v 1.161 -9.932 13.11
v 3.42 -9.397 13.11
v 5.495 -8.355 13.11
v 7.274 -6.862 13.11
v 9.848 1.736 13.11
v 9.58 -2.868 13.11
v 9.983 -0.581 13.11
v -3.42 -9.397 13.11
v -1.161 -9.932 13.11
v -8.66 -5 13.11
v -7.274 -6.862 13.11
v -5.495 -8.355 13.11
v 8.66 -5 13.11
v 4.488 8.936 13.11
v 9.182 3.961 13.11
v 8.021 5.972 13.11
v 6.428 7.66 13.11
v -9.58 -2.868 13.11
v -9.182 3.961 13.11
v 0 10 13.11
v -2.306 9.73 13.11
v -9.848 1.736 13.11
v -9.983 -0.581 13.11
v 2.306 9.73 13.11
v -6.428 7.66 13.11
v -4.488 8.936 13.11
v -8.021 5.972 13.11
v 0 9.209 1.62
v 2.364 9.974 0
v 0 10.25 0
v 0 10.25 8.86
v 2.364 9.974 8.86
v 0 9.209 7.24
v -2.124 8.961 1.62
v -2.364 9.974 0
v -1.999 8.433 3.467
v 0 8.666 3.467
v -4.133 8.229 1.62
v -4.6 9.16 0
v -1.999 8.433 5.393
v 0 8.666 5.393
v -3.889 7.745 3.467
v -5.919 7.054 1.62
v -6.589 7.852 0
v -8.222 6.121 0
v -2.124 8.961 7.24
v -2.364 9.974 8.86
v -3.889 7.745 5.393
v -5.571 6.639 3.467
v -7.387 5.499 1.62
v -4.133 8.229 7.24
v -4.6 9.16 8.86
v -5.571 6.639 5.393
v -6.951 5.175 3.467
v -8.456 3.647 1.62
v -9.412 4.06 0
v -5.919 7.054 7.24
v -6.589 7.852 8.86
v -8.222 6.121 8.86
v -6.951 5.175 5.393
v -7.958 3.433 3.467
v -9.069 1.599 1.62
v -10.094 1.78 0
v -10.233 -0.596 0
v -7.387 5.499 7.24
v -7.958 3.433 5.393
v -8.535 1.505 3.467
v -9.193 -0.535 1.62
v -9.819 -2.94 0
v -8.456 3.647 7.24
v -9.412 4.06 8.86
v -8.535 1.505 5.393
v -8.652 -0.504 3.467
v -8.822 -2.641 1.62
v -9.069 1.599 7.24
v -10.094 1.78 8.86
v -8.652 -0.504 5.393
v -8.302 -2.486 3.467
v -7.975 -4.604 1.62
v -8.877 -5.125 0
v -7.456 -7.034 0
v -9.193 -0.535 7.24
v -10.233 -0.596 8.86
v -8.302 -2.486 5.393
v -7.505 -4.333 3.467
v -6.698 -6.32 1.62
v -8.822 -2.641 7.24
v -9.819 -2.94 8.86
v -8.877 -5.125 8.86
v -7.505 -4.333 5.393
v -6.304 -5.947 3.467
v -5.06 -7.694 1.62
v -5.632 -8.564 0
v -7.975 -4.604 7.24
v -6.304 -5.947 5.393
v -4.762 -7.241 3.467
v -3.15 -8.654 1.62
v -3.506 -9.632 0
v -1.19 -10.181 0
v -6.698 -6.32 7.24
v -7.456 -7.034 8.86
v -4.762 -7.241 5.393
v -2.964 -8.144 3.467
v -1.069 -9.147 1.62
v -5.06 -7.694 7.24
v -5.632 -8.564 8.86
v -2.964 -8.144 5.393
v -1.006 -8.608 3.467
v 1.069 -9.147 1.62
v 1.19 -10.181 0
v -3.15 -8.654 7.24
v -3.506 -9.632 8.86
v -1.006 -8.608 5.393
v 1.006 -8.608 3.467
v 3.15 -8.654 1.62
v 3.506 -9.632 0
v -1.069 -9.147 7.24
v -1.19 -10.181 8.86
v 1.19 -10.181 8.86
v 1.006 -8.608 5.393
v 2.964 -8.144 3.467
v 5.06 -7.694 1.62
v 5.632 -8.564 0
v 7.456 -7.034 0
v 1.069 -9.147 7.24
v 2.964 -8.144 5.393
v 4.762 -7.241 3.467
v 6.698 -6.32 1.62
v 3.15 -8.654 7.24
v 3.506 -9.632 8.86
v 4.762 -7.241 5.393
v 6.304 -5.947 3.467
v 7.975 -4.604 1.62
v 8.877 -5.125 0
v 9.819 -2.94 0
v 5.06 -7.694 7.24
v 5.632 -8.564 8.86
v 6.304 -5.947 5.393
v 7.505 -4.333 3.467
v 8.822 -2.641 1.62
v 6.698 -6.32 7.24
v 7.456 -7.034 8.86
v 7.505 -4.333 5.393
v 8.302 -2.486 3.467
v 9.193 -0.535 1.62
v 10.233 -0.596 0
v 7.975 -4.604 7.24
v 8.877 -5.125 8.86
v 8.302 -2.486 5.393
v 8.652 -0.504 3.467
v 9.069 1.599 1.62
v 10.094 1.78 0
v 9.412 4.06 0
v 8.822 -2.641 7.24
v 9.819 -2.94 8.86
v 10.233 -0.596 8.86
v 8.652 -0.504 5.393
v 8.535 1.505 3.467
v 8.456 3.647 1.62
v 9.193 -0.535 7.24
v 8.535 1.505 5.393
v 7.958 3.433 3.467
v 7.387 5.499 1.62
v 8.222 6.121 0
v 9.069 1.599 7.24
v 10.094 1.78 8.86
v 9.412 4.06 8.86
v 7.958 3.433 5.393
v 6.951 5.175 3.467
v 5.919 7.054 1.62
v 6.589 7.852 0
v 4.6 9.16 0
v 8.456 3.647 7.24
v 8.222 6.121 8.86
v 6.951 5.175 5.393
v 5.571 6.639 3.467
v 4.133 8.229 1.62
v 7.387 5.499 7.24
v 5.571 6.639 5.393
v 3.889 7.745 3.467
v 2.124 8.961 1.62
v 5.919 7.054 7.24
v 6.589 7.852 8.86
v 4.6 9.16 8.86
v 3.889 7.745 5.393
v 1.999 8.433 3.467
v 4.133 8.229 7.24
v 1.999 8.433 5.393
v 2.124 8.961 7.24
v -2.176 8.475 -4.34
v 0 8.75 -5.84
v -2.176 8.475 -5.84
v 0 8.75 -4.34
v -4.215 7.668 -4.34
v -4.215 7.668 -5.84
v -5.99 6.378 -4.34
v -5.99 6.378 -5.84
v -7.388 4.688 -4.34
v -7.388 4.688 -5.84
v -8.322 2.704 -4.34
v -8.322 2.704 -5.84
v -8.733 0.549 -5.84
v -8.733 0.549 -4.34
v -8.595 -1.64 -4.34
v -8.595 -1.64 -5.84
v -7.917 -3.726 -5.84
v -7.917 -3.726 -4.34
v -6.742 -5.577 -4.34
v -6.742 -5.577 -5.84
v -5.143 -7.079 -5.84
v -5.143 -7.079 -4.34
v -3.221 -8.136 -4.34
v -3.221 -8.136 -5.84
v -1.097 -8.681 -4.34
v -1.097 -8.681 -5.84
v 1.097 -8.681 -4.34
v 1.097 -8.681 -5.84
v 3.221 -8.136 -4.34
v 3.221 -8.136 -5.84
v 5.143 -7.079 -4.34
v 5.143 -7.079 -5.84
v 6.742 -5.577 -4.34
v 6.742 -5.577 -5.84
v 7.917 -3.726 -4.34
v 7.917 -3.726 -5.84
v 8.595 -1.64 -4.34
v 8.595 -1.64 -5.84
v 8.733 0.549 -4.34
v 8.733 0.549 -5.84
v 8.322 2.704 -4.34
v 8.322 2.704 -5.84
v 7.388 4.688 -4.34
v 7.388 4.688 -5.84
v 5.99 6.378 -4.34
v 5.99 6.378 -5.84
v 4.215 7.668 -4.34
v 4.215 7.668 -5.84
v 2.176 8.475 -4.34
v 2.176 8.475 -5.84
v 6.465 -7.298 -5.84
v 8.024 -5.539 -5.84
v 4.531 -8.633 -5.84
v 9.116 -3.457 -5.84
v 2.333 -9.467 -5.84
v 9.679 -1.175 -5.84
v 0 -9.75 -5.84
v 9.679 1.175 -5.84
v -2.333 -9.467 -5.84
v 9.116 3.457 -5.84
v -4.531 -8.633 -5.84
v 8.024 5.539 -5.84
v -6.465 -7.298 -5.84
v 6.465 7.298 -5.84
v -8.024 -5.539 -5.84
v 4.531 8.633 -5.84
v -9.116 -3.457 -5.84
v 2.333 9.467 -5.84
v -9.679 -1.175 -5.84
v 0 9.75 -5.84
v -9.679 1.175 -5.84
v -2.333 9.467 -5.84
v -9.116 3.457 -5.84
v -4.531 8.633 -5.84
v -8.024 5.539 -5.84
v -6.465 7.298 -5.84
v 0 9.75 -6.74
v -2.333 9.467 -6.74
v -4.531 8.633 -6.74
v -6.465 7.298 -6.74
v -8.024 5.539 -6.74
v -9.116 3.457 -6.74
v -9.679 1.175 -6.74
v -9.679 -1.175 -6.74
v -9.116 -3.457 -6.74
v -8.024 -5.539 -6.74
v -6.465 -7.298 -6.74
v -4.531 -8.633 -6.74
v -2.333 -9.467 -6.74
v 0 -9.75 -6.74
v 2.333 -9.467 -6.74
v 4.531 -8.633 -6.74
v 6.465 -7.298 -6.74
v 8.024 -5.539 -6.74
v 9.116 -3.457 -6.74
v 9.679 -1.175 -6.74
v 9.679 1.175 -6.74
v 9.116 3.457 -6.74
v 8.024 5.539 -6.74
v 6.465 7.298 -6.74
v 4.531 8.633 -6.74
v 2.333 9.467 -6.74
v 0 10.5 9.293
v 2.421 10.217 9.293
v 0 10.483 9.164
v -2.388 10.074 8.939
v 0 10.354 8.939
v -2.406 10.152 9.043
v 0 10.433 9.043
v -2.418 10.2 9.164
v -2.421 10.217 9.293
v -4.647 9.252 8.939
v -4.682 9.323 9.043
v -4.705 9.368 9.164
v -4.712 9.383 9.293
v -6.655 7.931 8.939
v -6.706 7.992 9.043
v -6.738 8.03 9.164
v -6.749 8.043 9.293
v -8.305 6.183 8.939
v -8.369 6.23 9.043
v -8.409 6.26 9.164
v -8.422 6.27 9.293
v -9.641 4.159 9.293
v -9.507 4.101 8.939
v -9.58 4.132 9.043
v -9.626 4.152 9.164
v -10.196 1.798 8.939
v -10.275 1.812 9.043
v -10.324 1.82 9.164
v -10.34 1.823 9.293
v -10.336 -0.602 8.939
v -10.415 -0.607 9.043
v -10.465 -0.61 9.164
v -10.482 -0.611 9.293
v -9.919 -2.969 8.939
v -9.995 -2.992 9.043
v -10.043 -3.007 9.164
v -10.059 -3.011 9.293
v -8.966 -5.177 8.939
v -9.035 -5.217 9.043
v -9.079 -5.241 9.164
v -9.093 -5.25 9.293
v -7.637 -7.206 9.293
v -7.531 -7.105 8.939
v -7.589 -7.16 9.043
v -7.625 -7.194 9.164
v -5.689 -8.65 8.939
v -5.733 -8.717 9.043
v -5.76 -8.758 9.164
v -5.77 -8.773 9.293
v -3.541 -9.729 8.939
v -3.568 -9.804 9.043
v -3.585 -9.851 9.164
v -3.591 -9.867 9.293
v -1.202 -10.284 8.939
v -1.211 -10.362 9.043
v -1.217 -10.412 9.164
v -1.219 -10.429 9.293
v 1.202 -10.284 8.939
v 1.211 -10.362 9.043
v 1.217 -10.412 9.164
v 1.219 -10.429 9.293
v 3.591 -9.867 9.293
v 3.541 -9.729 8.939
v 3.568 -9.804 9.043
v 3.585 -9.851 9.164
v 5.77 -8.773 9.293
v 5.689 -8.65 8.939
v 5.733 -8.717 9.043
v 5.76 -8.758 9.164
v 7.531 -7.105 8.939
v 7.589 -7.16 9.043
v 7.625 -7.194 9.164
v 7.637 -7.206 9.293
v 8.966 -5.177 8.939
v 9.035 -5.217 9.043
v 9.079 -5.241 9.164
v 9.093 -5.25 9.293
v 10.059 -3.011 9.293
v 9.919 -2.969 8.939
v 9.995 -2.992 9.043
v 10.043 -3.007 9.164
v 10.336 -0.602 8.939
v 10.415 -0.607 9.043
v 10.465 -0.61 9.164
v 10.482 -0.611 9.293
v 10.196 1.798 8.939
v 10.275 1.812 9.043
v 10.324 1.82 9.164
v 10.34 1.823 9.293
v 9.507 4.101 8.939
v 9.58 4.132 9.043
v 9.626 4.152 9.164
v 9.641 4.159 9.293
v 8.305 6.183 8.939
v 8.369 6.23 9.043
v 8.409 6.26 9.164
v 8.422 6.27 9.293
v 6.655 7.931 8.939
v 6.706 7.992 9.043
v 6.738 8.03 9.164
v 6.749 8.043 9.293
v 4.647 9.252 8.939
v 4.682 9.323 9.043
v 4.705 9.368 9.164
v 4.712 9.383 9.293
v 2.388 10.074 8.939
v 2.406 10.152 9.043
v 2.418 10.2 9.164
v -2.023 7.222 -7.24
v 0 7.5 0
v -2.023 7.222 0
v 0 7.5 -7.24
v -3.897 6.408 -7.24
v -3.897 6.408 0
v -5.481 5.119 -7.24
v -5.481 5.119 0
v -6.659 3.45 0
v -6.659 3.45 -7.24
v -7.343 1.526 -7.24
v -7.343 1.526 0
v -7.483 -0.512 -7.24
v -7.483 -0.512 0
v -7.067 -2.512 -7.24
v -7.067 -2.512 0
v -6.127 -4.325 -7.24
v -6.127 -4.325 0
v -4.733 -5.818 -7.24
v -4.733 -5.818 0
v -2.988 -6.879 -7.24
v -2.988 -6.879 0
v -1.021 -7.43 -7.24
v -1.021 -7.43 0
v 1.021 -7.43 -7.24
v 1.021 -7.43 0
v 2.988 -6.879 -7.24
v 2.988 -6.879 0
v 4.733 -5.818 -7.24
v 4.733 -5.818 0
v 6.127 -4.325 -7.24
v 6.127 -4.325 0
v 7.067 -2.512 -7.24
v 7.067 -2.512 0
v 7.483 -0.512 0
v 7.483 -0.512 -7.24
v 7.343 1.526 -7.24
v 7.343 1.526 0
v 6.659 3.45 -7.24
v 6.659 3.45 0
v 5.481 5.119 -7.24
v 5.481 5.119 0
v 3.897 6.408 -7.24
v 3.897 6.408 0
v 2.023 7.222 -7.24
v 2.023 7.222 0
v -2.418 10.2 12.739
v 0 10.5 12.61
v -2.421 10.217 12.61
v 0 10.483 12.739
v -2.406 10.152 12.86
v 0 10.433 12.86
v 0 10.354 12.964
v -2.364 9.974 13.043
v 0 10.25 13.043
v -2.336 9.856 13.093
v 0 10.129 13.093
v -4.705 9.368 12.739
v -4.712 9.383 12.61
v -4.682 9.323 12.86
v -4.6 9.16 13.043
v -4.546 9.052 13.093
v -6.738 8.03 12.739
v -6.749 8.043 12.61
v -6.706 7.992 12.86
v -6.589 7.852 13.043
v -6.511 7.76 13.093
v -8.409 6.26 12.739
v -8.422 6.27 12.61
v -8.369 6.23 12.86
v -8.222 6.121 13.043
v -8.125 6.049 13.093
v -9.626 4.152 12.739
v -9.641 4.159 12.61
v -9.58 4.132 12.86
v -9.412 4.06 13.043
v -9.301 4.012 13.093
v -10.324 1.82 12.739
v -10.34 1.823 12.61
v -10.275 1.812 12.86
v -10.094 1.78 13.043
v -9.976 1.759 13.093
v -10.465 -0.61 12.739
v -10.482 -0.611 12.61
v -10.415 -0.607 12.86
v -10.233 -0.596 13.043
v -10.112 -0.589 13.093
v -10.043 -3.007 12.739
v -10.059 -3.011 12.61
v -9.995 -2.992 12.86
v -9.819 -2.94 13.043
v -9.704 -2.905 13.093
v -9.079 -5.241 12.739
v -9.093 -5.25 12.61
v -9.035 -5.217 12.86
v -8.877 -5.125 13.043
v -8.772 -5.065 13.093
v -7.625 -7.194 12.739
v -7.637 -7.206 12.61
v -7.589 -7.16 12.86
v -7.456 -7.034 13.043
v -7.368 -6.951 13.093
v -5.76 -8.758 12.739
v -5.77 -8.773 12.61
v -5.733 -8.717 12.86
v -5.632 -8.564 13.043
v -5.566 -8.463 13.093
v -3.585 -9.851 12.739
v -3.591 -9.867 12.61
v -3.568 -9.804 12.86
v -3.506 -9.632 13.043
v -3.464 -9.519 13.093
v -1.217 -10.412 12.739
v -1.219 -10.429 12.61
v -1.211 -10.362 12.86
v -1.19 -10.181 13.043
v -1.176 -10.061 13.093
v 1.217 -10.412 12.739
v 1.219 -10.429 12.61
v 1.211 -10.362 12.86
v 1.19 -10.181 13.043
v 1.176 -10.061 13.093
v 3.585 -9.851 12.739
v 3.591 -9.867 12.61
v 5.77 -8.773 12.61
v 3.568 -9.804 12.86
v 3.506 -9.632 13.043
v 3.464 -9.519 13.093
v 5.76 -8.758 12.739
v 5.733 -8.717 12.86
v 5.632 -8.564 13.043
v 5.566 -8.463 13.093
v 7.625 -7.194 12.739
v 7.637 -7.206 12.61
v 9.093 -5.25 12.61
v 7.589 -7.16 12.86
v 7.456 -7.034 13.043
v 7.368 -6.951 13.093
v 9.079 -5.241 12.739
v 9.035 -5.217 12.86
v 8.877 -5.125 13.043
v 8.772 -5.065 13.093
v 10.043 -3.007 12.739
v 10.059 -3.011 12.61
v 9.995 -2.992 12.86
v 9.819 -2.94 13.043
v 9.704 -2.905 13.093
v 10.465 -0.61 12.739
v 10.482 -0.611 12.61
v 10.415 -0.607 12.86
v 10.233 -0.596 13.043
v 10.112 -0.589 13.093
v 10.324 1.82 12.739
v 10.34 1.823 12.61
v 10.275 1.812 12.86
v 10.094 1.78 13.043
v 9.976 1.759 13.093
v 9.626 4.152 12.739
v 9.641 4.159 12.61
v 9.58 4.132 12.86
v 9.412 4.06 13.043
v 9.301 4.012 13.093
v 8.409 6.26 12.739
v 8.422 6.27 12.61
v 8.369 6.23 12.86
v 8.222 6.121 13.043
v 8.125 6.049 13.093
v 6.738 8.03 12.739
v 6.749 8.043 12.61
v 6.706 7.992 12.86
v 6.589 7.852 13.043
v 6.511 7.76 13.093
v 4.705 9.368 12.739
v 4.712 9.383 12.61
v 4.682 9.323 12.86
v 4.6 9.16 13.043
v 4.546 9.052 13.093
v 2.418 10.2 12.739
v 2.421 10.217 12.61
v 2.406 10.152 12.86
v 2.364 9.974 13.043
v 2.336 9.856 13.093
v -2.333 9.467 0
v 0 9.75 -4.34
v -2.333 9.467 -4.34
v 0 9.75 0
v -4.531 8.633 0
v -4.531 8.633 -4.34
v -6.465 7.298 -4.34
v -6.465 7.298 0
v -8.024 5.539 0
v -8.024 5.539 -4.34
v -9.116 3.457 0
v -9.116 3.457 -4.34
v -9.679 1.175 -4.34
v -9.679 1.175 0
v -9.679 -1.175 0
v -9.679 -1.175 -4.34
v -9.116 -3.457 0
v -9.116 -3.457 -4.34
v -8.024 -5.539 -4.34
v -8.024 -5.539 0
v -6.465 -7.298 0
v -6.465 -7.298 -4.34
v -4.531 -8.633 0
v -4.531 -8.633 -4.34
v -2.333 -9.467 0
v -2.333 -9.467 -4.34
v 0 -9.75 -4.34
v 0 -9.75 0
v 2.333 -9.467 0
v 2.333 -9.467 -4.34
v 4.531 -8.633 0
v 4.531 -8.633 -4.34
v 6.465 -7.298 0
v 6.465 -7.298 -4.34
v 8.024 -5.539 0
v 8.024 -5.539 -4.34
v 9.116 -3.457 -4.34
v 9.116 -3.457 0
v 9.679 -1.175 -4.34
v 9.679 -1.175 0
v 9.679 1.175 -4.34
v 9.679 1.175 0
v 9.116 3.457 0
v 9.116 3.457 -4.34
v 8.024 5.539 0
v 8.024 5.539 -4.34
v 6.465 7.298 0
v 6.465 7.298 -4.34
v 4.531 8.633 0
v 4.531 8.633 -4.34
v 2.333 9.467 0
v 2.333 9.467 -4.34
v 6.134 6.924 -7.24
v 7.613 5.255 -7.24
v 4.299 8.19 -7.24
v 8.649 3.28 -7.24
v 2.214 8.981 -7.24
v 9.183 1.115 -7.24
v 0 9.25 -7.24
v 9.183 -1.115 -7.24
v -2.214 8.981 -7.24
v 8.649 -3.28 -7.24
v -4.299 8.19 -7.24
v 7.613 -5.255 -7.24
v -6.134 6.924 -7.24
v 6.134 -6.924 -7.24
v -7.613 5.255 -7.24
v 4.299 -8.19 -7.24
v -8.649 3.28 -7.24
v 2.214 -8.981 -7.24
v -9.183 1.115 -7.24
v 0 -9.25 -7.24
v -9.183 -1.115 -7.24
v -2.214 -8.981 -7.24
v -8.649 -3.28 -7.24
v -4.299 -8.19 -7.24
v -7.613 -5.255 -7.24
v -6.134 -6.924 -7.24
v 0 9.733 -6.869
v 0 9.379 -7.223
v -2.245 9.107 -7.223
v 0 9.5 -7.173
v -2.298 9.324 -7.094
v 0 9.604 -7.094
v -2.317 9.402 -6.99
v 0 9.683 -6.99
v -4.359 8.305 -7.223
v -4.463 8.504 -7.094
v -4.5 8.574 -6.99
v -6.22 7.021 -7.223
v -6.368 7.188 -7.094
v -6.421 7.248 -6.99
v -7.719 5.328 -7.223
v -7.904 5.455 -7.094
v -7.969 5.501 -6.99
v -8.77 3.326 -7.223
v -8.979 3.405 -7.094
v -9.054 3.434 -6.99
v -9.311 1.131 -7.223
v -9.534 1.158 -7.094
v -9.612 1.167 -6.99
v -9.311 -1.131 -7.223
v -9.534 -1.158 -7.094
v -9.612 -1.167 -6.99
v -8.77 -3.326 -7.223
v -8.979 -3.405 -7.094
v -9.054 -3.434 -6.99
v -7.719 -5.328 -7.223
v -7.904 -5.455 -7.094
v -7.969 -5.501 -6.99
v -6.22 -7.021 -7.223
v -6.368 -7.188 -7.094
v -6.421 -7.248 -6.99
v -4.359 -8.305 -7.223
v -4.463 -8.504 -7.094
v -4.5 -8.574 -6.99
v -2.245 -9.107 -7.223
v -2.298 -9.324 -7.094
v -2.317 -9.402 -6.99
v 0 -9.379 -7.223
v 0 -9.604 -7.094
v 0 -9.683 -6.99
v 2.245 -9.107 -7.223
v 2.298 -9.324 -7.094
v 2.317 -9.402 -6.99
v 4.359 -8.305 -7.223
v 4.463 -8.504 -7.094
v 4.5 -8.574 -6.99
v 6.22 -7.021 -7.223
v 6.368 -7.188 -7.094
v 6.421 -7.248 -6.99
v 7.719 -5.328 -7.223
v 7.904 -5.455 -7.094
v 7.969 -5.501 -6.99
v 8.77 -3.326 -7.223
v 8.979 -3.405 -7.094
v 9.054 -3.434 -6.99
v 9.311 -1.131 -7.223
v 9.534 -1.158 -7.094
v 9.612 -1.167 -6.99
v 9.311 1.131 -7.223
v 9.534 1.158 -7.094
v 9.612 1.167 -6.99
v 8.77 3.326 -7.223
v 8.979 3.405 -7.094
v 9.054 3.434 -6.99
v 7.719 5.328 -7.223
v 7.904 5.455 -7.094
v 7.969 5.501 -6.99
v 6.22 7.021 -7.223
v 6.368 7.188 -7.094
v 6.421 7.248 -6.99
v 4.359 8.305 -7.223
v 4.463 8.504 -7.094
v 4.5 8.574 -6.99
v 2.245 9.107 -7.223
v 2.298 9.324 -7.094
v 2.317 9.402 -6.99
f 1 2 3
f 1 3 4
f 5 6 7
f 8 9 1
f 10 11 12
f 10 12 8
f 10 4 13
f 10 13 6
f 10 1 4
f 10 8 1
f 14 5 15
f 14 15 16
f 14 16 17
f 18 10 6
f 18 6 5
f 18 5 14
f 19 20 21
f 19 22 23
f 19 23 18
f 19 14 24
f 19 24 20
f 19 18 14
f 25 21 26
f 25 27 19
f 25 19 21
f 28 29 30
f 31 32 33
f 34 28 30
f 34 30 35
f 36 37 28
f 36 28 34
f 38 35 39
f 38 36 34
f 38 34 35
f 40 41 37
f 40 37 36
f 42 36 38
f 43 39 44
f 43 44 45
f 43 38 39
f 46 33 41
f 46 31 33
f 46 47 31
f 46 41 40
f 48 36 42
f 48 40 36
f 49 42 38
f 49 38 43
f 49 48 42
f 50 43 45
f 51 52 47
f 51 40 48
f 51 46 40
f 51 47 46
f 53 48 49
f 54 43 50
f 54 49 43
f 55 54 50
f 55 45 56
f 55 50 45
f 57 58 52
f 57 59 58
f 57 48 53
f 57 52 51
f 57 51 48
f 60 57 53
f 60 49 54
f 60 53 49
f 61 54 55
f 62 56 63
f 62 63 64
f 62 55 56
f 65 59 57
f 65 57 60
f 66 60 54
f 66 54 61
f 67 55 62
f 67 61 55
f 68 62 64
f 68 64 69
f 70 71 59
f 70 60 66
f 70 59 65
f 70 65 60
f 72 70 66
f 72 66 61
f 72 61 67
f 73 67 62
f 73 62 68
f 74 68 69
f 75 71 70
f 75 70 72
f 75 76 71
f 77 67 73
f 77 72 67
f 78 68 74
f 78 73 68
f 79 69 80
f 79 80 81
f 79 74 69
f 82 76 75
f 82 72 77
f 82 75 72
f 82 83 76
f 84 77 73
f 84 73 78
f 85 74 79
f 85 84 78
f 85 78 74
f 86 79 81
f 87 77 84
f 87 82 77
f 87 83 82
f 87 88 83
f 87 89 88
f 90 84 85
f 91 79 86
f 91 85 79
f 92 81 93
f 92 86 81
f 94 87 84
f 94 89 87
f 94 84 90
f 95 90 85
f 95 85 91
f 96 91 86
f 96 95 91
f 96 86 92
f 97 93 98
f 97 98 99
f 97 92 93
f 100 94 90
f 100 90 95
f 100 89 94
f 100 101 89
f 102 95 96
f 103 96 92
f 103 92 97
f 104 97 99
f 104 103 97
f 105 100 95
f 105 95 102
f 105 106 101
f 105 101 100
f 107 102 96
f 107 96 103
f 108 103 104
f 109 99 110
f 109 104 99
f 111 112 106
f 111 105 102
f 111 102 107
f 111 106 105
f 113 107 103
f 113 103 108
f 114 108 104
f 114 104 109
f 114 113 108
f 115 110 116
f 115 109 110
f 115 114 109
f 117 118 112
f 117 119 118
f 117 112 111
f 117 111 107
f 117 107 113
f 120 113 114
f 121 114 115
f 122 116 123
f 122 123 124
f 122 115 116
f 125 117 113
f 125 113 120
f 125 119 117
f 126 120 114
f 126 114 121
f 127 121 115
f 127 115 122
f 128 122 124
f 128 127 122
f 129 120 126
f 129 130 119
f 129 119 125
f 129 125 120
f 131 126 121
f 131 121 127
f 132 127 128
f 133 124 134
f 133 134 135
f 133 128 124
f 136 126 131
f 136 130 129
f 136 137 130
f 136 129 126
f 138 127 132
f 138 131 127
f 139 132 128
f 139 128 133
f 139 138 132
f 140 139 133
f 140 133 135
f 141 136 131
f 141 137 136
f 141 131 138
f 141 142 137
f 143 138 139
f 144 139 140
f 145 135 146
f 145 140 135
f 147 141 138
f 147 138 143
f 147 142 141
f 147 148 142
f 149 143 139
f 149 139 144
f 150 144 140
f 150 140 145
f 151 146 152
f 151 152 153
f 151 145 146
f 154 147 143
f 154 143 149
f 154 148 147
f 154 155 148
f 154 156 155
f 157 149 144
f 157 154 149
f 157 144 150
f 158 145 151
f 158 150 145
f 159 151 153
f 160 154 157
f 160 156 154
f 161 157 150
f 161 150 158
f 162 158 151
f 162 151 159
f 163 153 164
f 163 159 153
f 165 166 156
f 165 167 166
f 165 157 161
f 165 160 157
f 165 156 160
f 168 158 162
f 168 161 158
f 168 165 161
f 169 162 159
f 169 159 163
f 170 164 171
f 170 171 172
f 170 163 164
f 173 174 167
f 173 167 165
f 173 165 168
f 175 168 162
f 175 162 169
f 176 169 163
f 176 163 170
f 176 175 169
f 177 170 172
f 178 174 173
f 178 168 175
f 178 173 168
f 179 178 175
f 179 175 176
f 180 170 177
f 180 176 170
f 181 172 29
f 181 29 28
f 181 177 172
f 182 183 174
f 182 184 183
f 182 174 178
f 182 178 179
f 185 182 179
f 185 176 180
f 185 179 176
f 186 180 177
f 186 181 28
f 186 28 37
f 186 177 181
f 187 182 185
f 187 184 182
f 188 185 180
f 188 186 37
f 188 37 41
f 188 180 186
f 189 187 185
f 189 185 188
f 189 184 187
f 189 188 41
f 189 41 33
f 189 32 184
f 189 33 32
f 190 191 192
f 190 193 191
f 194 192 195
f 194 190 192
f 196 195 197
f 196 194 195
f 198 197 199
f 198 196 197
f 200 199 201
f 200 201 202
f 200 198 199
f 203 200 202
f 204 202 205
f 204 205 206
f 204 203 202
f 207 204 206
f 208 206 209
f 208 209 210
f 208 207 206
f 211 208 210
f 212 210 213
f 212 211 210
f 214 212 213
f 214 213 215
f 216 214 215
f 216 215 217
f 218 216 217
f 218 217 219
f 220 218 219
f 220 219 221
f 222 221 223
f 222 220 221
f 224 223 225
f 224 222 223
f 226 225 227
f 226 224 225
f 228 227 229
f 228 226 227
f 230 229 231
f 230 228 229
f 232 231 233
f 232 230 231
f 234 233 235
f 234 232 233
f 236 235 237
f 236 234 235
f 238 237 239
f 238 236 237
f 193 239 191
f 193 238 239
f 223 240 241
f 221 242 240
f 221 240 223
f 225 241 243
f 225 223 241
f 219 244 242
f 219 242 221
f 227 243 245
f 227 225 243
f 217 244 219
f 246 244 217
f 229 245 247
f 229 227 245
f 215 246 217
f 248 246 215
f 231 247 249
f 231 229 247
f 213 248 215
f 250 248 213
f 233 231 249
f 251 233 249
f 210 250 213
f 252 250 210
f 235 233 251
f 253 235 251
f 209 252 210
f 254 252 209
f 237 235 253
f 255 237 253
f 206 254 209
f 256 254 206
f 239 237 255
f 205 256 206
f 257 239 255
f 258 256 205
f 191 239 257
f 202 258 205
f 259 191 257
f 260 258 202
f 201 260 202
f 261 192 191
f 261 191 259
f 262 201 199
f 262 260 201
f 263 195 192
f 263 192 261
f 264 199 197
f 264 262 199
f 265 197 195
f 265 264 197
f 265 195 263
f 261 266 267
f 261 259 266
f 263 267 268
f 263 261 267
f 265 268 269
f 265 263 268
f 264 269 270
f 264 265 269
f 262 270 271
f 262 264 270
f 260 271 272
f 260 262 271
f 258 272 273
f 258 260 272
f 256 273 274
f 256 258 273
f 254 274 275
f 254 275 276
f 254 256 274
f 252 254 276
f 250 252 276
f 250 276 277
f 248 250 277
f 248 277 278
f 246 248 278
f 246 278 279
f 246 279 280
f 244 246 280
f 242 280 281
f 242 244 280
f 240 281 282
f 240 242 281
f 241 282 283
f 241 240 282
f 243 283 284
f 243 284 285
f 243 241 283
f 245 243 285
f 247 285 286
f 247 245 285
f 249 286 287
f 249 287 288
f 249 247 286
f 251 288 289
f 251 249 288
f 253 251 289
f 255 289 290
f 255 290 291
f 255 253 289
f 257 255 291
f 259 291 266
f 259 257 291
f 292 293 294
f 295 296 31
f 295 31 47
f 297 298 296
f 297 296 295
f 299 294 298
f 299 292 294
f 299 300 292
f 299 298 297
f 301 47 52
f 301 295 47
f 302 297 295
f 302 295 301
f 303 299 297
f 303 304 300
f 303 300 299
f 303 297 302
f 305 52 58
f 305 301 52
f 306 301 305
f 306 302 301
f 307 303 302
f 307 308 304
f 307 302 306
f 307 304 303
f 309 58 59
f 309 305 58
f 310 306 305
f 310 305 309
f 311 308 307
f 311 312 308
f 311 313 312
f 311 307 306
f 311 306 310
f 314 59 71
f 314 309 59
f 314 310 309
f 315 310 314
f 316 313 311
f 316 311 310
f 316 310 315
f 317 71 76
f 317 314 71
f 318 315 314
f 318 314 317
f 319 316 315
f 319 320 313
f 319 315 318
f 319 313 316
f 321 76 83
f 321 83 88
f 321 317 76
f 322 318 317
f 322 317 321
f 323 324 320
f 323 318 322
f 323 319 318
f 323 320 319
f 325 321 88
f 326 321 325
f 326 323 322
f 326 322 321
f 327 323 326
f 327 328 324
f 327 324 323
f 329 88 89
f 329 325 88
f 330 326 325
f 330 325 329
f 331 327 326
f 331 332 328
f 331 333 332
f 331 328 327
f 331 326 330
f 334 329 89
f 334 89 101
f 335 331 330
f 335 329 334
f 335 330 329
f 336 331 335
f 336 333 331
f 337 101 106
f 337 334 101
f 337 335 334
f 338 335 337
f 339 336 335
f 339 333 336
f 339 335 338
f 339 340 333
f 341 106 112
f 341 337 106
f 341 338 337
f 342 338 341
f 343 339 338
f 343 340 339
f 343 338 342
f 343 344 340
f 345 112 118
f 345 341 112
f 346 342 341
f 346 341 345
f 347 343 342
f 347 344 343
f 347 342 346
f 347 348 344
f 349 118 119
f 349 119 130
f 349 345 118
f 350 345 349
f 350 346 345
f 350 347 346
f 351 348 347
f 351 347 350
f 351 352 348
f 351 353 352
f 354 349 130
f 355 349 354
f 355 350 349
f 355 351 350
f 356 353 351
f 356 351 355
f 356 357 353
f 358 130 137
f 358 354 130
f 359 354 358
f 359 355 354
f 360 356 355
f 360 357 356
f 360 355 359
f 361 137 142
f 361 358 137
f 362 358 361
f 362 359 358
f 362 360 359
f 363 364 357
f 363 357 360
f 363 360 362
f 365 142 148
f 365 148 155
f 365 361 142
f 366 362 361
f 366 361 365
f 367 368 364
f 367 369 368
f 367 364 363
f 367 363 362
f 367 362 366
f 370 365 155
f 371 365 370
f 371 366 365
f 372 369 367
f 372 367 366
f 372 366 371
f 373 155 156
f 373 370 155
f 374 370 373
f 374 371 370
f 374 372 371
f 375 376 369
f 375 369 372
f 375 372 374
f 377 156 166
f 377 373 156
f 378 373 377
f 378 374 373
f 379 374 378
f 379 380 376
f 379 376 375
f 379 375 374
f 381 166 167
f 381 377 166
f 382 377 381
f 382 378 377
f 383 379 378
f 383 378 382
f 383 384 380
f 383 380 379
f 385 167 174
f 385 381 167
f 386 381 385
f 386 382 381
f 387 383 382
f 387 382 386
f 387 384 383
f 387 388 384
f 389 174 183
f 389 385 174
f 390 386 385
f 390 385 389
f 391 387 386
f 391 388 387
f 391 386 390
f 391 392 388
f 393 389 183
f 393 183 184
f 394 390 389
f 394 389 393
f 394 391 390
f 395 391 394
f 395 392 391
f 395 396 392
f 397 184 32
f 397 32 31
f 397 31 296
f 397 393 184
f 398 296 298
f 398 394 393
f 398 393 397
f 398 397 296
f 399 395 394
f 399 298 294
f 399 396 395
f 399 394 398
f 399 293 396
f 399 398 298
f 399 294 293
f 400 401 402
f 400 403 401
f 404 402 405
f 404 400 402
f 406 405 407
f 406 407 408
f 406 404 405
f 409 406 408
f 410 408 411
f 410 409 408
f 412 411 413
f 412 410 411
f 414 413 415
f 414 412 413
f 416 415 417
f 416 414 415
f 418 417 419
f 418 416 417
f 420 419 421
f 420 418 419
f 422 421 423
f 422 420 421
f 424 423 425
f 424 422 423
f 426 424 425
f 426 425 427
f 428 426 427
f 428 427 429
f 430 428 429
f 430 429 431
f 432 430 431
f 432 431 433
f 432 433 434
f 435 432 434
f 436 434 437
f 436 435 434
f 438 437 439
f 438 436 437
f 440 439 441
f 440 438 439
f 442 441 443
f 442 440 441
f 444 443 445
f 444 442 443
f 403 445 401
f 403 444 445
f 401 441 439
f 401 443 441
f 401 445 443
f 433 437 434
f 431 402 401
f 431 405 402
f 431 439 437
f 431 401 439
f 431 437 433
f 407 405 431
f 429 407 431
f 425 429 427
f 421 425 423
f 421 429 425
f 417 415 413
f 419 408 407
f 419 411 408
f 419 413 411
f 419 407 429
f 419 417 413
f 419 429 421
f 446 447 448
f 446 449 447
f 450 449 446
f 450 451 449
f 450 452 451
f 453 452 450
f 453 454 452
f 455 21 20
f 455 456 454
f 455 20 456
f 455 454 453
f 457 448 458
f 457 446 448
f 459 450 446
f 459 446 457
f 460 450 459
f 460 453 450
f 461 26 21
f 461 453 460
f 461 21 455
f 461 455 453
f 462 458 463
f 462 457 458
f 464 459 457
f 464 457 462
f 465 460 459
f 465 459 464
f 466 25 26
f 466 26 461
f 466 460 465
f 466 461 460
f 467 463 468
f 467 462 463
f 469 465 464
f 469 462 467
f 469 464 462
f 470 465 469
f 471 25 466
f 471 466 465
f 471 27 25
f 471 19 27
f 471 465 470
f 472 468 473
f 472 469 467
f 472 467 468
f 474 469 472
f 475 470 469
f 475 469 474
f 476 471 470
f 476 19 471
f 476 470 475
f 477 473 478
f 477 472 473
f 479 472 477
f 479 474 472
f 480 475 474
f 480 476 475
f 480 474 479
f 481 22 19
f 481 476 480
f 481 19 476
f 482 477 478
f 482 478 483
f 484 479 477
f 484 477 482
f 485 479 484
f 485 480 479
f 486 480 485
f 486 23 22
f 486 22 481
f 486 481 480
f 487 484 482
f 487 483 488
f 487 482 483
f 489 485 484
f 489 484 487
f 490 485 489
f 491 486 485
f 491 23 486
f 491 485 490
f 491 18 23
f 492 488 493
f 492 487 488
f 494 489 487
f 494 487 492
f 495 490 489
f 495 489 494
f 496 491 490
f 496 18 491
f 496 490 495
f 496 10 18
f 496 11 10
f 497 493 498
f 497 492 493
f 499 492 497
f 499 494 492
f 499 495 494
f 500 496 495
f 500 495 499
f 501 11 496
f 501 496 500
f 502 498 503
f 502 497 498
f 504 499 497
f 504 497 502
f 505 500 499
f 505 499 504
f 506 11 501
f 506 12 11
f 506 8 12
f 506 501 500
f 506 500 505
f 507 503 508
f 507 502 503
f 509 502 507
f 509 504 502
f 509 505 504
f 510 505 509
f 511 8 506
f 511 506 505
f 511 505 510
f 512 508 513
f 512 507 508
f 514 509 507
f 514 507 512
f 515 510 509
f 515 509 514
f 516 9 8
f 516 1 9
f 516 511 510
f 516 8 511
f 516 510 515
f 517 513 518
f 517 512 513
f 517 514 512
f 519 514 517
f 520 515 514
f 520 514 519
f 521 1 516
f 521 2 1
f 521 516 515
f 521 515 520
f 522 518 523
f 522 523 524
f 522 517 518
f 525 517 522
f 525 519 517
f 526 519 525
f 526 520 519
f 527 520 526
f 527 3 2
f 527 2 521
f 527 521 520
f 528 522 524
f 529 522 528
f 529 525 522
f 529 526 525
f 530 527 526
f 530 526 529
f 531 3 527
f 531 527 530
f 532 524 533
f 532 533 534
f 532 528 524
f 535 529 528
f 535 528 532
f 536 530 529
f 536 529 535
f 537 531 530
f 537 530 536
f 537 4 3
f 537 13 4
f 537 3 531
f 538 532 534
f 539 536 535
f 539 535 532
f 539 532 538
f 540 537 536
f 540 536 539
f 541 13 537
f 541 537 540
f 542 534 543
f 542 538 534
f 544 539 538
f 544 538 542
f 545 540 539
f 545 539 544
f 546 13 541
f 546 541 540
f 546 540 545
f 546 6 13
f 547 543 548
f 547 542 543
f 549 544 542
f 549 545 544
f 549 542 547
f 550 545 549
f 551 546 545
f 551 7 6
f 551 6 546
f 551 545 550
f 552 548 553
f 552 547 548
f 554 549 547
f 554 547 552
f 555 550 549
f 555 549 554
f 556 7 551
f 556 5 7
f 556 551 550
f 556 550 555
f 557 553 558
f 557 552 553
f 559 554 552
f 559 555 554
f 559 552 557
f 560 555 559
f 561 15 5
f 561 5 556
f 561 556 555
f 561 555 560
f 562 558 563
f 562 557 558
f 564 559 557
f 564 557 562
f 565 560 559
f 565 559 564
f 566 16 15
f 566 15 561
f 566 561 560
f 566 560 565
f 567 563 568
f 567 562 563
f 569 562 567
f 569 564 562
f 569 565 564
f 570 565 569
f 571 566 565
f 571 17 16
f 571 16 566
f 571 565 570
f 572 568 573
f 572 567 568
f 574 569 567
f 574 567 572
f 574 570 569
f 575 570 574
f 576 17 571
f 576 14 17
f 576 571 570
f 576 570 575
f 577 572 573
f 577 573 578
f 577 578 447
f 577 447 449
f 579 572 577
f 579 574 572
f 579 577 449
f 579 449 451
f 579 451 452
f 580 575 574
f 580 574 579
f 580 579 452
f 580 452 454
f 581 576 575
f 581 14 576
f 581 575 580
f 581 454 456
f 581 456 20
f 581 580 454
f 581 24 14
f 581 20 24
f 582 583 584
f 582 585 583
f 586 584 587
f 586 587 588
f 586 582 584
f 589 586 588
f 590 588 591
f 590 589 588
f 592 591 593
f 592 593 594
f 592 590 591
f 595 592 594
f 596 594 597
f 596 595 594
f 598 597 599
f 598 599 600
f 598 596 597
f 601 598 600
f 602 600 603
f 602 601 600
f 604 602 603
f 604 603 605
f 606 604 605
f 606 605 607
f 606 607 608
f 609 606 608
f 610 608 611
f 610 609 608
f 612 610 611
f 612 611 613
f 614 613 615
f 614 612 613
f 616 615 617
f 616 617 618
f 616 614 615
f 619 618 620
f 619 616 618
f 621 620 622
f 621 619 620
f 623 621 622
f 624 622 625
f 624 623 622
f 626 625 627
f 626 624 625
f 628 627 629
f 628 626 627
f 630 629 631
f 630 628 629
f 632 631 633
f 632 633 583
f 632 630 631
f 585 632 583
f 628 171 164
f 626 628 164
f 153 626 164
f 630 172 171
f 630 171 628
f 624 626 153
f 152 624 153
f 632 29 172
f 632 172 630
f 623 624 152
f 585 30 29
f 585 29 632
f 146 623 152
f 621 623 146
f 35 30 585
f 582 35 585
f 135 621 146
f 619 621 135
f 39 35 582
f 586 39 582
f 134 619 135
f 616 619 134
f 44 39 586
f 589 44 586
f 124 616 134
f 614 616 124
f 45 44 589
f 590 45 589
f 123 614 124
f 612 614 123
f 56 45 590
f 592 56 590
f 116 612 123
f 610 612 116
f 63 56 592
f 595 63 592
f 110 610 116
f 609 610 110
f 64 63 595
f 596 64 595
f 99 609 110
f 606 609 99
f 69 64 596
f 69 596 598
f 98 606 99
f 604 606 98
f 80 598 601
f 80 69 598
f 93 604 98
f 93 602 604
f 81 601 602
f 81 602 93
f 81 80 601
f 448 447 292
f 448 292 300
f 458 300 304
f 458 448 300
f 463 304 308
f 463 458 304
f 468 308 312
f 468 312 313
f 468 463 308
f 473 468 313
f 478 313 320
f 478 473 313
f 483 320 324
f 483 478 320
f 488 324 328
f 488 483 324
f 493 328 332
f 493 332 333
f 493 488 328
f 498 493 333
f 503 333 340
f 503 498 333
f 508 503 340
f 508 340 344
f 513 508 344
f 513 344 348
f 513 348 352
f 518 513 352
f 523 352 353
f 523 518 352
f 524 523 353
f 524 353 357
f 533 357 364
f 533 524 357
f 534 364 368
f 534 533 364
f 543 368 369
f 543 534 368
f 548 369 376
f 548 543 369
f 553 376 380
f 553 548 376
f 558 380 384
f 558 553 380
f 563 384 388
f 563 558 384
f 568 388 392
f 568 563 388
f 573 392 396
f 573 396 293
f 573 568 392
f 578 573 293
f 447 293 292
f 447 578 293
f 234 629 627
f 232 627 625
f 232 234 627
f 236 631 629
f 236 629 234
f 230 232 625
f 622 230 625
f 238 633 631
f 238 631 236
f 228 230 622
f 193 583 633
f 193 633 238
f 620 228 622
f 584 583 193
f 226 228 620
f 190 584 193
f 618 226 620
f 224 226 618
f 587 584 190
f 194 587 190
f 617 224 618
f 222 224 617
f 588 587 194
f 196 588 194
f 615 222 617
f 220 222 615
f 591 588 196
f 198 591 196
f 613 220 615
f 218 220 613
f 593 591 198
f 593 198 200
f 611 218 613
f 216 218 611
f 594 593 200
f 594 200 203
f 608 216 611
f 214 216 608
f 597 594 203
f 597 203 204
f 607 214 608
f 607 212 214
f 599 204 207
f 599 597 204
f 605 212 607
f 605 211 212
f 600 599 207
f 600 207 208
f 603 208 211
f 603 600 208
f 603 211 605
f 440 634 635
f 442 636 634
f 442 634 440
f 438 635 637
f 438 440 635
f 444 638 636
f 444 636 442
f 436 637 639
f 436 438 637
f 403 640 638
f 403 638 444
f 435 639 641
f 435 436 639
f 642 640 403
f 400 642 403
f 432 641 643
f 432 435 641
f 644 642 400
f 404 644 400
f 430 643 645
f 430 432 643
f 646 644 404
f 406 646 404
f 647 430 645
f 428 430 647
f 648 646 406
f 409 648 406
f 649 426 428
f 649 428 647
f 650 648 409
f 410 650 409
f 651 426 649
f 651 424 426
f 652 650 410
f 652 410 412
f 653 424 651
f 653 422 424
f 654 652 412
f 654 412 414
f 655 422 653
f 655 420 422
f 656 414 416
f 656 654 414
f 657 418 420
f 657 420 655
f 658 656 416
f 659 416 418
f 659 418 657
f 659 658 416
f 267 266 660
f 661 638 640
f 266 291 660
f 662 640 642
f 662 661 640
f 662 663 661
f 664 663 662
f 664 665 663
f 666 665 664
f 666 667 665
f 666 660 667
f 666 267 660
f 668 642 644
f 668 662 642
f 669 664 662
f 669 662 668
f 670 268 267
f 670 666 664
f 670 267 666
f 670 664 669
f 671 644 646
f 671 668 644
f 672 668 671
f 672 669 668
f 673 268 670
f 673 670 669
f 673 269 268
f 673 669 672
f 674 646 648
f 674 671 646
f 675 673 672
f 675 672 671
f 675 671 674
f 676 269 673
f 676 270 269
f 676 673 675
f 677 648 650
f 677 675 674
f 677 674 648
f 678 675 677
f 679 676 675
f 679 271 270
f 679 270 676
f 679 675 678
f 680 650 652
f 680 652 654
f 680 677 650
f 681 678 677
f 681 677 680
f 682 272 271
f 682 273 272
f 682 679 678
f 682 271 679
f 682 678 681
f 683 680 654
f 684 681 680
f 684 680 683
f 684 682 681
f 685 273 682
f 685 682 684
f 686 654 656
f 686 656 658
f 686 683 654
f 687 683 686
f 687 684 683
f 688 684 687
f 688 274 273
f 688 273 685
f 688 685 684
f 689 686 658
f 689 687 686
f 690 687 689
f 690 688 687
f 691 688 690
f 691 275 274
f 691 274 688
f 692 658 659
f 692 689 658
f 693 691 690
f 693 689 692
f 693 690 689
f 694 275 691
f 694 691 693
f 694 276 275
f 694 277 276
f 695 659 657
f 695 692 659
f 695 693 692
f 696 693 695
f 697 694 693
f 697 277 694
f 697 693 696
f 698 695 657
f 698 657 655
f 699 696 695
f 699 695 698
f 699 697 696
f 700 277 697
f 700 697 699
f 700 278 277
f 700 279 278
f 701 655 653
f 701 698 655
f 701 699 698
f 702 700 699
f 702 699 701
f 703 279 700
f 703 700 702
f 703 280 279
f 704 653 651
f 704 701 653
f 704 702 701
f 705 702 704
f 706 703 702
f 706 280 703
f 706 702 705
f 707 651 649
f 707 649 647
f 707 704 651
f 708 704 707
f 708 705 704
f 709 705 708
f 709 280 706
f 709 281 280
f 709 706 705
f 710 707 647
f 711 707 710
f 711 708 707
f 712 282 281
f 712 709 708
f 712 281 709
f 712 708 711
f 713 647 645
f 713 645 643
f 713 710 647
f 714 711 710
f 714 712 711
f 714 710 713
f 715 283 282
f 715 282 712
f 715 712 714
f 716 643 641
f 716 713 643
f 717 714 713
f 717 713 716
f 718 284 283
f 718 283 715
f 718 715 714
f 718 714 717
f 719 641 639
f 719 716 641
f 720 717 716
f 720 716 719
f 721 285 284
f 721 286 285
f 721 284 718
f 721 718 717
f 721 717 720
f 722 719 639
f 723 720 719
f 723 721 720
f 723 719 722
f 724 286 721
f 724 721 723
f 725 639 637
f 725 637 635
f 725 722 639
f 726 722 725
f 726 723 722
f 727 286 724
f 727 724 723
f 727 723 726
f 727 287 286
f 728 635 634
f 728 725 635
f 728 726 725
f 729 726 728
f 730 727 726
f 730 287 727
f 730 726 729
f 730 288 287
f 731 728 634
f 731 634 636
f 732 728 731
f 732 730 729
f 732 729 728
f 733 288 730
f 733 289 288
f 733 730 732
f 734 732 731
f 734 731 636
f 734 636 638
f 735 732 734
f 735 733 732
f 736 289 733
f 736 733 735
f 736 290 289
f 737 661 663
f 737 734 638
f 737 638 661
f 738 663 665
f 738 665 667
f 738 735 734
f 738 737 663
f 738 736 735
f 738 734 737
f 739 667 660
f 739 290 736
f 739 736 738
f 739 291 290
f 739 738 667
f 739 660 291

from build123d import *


# Not quite as in the source:
# - a fillet or chamfer that OpenCascade refuses, or shapes differently, is made with other operations: its cross-section is extruded or revolved along the edge and cut away or added


with BuildPart() as f1:
    # F0 (on Right) → F1 (revolve)
    with BuildSketch(Plane.YZ):
        with BuildLine():
            Line((7.5, 0), (7.5, -7.24))
            Line((7.5, -7.24), (9.75, -7.24))
            Line((9.75, -7.24), (9.75, -5.84))
            Line((9.75, -5.84), (8.75, -5.84))
            Line((8.75, -5.84), (8.75, -4.34))
            Line((8.75, -4.34), (9.75, -4.34))
            Line((9.75, -4.34), (9.75, 0))
            Line((9.75, 0), (10.25, 0))
            ThreePointArc((10.25, 0), (8.5974540278, 4.43), (10.25, 8.86))
            Line((10.25, 8.86), (10.5, 8.86))
            Line((10.5, 8.86), (10.5, 13.11))
            Line((10.5, 13.11), (0, 13.11))
            Line((0, 13.11), (0, 8.86))
            Line((0, 8.86), (0, 0))
            Line((0, 0), (7.5, 0))
        make_face()
    revolve(axis=Axis((0, 0, 4.43), (0, 0, 1)))

    # F2: fillet of radius 0.5 on 3 edges, made by hand

    # F2_s1 → F2_t2 (revolve, cut)
    with BuildSketch(Plane.YZ):
        with BuildLine():
            ThreePointArc((10.25, 8.86), (10.4330127019, 9.0430127019), (10.5, 9.2930127019))
            Line((10.5, 9.2930127019), (10.5, 8.86))
            Line((10.5, 8.86), (10.25, 8.86))
        make_face()
    revolve(axis=Axis((0, 0, 8.86), (0, 0, 1)), mode=Mode.SUBTRACT)

    # F2_s3 → F2_t4 (revolve, cut)
    with BuildSketch(Plane.YZ):
        with BuildLine():
            ThreePointArc((9.25, -7.24), (9.6035533906, -7.0935533906), (9.75, -6.74))
            Line((9.75, -6.74), (9.75, -7.24))
            Line((9.75, -7.24), (9.25, -7.24))
        make_face()
    revolve(axis=Axis((0, 0, -7.24), (0, 0, 1)), mode=Mode.SUBTRACT)

    # F2_s5 → F2_t6 (revolve, cut)
    with BuildSketch(Plane.YZ):
        with BuildLine():
            ThreePointArc((10.5, 12.61), (10.3535533906, 12.9635533906), (10, 13.11))
            Line((10, 13.11), (10.5, 13.11))
            Line((10.5, 13.11), (10.5, 12.61))
        make_face()
    revolve(axis=Axis((0, 0, 13.11), (0, 0, 1)), mode=Mode.SUBTRACT)


solid = f1.part
